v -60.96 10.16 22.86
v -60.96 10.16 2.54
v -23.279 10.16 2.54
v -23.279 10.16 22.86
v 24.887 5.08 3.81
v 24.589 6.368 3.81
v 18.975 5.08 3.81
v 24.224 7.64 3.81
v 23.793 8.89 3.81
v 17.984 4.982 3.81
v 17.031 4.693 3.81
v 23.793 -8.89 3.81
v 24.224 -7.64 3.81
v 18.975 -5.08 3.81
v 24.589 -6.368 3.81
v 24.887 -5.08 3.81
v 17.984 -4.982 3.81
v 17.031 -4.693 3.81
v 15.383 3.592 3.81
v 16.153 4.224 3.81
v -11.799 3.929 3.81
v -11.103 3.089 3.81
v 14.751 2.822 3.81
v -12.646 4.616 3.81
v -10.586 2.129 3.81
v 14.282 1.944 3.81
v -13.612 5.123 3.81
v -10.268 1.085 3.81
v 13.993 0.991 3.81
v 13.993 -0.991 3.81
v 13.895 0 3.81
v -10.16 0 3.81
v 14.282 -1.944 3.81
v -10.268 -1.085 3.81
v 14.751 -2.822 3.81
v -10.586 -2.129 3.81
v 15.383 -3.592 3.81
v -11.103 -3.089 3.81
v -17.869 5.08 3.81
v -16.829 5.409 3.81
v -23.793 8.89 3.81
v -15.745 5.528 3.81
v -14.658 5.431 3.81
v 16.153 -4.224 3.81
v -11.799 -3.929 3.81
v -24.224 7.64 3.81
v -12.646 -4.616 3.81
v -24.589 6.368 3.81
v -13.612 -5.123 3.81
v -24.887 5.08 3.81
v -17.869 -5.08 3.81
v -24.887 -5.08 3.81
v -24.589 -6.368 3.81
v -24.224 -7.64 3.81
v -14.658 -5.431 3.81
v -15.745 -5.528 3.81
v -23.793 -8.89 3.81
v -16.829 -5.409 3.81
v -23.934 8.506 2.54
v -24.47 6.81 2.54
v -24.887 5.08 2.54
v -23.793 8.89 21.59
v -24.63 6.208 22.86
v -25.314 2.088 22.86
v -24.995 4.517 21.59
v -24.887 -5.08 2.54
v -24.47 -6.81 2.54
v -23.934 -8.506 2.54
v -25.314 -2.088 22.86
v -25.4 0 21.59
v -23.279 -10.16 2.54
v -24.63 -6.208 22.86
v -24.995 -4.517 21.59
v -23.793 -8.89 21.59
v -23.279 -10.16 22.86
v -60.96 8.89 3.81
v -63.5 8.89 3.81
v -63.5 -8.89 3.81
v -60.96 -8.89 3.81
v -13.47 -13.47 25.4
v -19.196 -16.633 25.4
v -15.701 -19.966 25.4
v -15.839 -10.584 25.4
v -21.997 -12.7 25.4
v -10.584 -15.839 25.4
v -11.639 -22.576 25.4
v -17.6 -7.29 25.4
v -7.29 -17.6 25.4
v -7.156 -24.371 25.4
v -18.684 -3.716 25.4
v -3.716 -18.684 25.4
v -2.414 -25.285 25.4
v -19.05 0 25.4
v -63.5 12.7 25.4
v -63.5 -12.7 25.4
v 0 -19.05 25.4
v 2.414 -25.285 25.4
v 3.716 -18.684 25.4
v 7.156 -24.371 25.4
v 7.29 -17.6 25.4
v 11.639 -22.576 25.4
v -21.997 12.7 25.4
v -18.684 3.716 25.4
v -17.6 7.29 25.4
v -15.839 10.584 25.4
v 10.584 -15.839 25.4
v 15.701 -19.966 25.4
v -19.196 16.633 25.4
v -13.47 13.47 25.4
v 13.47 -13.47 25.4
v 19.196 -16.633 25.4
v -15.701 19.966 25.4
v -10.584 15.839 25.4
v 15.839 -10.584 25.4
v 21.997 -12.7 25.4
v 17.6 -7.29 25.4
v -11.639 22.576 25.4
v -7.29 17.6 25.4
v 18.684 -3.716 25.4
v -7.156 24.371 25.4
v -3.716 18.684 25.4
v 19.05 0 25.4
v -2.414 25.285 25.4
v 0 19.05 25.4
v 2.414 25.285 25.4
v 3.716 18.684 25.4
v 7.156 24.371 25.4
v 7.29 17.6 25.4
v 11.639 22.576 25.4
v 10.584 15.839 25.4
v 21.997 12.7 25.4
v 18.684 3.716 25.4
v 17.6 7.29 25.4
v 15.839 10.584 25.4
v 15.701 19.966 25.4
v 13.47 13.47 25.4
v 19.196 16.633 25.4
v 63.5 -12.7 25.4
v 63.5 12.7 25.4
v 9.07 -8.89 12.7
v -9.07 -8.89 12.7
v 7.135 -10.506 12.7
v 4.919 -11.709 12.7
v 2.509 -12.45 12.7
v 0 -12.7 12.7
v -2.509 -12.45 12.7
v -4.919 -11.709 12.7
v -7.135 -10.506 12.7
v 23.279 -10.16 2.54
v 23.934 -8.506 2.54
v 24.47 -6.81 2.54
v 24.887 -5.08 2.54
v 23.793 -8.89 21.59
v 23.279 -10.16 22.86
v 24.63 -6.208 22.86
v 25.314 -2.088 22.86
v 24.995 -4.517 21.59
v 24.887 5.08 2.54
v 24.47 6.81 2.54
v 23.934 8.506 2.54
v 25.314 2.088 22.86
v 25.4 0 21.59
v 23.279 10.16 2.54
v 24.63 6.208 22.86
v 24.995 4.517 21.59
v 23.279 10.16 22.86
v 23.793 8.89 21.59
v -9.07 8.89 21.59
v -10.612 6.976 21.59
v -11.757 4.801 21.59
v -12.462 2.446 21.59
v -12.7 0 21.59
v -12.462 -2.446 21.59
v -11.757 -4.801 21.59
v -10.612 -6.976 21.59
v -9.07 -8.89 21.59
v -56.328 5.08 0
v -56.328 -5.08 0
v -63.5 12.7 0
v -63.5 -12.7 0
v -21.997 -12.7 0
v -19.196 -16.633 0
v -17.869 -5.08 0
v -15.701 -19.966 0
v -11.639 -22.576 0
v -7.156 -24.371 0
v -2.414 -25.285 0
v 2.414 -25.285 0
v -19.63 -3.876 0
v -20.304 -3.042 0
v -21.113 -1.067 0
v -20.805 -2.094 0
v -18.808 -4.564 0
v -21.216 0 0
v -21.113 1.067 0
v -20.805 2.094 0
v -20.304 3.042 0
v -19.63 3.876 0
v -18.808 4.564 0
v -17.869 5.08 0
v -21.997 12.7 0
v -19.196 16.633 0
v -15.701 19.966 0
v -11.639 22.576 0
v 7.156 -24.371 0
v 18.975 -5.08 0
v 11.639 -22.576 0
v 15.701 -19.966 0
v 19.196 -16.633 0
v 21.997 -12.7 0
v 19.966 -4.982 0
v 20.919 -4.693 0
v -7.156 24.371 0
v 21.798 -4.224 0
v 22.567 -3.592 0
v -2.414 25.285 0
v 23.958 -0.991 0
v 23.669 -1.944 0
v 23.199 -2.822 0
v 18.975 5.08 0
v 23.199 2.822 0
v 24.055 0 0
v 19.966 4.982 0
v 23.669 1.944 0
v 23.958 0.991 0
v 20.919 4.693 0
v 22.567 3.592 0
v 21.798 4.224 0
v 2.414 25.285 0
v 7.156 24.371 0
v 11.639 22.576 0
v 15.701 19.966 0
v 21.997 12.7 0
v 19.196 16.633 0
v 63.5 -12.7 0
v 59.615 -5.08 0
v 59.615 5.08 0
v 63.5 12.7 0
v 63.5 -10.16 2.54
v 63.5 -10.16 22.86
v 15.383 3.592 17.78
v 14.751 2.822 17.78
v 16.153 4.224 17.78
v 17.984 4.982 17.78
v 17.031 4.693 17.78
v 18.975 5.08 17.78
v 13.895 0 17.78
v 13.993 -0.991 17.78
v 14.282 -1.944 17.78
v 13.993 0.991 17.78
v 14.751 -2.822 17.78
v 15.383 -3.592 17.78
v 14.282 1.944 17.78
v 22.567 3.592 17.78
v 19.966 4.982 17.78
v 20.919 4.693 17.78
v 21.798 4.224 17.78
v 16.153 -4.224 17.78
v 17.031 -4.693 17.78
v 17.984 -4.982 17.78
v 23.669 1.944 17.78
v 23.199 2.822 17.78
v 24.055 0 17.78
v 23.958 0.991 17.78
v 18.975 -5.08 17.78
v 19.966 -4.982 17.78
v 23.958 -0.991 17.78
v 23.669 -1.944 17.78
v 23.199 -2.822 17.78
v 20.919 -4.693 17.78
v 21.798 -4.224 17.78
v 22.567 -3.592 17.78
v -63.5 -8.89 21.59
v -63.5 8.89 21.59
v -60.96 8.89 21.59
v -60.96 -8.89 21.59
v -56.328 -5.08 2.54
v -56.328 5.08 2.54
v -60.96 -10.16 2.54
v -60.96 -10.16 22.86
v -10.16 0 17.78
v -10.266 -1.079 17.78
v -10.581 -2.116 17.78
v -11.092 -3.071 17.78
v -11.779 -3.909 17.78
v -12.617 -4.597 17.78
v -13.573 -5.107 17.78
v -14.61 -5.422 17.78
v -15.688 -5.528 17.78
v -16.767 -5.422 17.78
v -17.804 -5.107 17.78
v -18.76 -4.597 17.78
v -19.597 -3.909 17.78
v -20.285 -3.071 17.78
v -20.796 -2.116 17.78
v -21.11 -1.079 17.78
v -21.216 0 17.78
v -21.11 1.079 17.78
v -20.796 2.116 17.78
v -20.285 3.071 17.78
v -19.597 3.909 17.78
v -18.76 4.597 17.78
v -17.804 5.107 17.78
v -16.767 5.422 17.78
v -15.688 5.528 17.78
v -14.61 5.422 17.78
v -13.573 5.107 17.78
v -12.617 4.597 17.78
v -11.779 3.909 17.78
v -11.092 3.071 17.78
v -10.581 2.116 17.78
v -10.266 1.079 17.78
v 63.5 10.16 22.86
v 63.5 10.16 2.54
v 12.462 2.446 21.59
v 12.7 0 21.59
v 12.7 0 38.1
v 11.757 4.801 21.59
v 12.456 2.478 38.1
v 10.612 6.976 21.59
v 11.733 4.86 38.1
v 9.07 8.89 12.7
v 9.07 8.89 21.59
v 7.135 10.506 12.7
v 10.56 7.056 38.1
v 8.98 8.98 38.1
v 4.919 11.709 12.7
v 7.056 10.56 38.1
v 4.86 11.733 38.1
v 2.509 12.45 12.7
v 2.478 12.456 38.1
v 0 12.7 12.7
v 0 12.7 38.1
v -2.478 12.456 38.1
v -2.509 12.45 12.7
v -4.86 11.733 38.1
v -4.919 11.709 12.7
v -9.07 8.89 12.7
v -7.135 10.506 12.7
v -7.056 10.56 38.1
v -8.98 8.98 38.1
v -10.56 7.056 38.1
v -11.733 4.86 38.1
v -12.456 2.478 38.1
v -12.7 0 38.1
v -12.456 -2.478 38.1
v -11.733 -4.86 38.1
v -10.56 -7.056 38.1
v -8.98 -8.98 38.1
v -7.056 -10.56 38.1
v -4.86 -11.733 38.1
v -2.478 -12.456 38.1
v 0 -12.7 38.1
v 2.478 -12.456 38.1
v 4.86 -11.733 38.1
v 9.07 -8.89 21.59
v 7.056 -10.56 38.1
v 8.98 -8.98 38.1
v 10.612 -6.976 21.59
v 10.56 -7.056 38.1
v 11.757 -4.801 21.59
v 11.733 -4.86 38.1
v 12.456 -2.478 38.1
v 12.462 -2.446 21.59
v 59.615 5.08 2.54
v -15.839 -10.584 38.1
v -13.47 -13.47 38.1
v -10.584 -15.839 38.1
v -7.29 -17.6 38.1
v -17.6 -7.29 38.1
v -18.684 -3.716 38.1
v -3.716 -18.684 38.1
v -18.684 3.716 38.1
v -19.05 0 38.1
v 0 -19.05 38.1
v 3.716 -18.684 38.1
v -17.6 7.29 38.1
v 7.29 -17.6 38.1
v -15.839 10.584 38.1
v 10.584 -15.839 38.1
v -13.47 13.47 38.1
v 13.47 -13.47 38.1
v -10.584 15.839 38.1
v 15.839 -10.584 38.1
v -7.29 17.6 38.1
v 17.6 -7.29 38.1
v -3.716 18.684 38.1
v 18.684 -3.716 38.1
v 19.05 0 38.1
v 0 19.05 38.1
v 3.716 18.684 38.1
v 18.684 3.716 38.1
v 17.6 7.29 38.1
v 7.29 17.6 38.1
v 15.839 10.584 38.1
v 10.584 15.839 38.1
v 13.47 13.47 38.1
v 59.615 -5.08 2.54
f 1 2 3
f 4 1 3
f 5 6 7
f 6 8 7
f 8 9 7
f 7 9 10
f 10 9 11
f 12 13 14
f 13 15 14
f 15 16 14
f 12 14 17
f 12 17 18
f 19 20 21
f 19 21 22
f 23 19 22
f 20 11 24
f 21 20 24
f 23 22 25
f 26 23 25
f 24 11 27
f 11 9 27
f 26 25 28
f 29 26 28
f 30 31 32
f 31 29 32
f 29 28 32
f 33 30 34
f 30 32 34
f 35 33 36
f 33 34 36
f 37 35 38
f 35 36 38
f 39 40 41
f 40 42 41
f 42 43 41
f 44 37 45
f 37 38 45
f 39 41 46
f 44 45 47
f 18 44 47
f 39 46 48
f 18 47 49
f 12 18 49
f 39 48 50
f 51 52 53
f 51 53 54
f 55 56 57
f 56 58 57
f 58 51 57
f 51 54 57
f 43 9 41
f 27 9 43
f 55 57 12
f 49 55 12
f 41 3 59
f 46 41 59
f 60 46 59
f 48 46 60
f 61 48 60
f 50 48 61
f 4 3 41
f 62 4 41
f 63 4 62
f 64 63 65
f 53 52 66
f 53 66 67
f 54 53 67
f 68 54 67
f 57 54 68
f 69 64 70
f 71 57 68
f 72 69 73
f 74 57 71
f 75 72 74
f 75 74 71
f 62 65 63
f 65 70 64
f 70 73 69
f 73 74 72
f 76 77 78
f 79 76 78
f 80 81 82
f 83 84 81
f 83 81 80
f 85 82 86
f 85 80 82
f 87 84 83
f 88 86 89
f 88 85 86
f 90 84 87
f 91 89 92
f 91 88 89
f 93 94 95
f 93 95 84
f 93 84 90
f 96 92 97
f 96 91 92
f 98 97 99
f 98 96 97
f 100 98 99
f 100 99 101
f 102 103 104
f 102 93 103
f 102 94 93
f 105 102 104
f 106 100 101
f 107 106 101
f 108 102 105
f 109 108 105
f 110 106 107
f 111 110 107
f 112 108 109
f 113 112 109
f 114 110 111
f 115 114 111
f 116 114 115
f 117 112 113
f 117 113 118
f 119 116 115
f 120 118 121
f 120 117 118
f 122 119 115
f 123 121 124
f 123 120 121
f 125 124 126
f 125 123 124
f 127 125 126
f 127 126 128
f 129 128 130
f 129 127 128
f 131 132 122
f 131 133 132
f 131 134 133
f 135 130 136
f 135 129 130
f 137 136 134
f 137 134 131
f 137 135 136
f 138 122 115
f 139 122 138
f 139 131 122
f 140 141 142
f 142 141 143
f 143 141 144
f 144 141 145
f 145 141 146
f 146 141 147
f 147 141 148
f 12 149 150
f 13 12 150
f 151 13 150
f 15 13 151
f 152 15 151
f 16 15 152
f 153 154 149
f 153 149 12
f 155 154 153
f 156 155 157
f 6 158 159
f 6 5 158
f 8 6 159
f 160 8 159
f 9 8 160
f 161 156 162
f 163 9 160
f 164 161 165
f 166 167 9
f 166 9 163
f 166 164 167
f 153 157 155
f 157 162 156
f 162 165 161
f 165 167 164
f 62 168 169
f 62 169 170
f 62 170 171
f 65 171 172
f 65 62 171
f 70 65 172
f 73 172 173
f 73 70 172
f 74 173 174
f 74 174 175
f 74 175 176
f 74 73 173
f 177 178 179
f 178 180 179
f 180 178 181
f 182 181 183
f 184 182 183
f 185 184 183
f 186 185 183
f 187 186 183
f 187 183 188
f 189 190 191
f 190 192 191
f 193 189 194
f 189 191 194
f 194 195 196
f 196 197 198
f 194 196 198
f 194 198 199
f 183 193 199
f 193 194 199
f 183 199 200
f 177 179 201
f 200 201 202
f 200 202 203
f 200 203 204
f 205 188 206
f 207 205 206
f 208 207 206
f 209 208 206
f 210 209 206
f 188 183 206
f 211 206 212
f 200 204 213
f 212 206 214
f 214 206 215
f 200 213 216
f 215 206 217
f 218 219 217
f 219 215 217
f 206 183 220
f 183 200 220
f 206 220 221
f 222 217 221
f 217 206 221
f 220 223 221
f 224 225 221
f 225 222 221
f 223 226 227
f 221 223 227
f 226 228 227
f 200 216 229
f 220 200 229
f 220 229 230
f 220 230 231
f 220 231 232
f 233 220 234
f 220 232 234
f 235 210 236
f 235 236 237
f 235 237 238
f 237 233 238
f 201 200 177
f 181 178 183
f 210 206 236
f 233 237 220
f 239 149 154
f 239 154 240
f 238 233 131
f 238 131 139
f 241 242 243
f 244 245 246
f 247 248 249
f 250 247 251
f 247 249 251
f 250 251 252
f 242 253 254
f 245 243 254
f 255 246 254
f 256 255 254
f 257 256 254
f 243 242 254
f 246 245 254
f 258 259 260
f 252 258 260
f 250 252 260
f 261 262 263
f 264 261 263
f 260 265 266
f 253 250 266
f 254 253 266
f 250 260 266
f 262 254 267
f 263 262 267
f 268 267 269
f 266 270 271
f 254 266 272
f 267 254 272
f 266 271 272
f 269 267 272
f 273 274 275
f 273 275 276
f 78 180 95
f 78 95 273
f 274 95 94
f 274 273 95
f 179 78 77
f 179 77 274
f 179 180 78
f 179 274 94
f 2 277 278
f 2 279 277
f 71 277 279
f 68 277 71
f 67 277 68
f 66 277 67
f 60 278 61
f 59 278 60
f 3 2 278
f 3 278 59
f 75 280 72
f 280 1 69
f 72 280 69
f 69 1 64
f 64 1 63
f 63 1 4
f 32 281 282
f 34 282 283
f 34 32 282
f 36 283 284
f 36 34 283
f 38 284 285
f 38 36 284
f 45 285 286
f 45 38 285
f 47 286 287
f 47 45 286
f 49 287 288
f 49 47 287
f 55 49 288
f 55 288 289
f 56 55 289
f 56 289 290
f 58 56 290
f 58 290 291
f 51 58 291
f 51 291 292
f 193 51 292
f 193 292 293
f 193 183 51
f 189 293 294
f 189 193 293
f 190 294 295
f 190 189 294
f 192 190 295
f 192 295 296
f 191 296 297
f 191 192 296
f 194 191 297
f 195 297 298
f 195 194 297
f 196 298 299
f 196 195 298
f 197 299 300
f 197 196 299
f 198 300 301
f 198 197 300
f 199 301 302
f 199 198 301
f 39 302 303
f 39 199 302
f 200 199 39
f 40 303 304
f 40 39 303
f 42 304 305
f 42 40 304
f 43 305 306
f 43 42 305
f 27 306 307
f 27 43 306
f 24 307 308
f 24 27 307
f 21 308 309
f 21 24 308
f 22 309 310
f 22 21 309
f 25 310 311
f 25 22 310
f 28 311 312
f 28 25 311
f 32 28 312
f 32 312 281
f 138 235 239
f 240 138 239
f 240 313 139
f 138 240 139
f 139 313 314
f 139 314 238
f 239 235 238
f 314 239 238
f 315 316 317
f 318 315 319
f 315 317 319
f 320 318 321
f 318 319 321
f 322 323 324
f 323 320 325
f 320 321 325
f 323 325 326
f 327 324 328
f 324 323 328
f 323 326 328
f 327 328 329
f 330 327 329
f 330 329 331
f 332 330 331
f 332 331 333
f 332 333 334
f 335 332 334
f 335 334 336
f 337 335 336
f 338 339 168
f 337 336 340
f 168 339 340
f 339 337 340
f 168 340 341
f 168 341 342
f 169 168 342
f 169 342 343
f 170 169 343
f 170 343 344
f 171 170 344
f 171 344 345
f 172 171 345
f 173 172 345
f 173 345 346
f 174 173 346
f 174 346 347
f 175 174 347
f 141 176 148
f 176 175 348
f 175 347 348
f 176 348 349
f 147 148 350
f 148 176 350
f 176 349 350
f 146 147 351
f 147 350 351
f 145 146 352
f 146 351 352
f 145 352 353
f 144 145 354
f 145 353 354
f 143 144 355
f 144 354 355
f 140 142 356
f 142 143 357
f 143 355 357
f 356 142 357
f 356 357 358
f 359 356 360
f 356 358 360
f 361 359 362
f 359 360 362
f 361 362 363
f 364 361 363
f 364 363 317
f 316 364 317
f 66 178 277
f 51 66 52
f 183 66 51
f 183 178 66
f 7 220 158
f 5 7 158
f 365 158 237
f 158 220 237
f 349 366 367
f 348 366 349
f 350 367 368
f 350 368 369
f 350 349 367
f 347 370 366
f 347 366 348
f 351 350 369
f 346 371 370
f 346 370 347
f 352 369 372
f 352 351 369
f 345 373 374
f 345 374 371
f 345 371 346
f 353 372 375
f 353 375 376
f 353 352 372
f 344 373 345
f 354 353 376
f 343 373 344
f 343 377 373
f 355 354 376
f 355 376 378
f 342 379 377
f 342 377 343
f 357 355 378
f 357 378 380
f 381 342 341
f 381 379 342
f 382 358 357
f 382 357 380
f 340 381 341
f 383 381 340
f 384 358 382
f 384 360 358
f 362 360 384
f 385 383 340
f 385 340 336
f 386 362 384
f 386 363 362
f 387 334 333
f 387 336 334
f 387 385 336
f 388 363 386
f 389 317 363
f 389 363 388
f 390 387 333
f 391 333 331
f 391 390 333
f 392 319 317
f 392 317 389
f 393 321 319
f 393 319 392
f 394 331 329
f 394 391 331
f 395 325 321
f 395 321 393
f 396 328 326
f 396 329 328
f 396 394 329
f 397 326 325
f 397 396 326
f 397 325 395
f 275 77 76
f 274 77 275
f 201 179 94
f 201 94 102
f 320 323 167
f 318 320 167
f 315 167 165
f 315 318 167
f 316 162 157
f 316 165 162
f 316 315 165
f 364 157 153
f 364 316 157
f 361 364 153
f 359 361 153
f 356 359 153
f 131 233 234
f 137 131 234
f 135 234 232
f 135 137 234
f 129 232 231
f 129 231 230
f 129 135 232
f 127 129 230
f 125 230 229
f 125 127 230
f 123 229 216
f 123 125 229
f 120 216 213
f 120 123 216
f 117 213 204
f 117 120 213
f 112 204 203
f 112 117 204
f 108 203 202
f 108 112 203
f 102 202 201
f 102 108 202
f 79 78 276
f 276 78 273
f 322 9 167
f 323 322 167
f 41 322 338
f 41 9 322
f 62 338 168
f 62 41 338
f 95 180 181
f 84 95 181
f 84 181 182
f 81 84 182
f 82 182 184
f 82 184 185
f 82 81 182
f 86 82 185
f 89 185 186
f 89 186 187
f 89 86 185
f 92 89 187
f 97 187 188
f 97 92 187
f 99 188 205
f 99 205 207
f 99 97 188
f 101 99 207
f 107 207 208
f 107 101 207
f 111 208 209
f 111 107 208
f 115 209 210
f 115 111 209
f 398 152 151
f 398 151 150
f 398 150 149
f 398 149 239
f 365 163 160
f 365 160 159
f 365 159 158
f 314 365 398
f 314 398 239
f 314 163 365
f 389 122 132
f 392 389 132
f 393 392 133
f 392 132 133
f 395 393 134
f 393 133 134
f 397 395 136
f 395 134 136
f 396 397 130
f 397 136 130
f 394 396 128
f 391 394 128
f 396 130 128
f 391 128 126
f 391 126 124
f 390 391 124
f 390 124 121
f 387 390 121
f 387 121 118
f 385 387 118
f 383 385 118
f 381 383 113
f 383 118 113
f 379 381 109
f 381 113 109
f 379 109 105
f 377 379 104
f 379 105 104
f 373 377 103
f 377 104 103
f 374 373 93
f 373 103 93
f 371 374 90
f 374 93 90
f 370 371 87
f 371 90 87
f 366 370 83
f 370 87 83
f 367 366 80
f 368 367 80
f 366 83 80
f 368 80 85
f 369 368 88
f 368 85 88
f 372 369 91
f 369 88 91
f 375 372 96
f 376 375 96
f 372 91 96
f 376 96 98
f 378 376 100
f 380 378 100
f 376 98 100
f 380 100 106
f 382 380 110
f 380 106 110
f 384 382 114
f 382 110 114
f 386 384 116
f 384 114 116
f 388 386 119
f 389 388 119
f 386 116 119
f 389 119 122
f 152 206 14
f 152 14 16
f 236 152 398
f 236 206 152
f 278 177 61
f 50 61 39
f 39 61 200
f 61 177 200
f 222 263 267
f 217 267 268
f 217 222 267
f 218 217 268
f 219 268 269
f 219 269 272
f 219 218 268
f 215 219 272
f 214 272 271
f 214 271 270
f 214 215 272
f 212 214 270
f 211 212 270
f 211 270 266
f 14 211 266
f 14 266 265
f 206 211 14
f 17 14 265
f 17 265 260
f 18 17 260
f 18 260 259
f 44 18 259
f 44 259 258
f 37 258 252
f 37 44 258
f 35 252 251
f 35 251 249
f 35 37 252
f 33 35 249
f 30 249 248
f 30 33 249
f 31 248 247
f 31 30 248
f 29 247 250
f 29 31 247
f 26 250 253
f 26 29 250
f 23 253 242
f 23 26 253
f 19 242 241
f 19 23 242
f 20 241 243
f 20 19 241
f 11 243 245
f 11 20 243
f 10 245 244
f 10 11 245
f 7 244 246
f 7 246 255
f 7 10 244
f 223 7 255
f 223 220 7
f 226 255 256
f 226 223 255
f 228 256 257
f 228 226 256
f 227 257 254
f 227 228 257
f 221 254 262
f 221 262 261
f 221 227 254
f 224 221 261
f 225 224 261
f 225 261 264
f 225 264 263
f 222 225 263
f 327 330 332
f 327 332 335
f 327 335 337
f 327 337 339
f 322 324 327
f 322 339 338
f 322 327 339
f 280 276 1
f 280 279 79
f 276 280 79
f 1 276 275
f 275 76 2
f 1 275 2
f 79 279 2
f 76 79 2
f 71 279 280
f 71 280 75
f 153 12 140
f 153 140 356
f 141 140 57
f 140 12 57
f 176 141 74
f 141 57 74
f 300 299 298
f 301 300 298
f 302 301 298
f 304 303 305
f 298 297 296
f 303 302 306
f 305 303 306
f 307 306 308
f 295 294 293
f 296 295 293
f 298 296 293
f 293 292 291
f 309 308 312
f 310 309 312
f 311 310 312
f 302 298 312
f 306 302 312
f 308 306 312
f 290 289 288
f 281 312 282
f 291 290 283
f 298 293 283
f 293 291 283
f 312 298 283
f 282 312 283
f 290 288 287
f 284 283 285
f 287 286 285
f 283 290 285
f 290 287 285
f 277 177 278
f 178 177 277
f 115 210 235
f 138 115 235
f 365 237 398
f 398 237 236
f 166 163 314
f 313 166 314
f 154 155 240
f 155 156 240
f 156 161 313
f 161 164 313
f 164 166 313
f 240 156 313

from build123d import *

# Parameters (mm, degrees)
F0_W      = 127
F0_H      = 25.4
F1_DEPTH  = 25.4
F2_T      = -2.54
F3_R      = 25.4
F4_DEPTH  = 25.4
F5_R      = 19.05
F6_DEPTH  = 12.7
F7_R      = 12.7
F8_DEPTH  = 25.4
F9_W      = 17.78
F9_H      = 17.78
F10_DEPTH = 150.622
F11_W     = 40.64
F11_H     = 10.16
F12_DEPTH = 12.7
F13_R     = 5.528236
F13_R_2   = 5.08
F14_DEPTH = 17.78


with BuildPart() as f1:
    # F0 (on Top) → F1 (new body)
    with BuildSketch(Plane.XY):
        Rectangle(F0_W, F0_H)
    extrude(amount=F1_DEPTH)

    # F2
    f2_openings = [f1.faces().sort_by_distance(p)[0] for p in [
        (63.5, 0, 12.7),
    ]]
    offset(amount=F2_T, openings=f2_openings)

    # F3 (on face) → F4 (join)
    with BuildSketch(Plane.XY.offset(25.4)):
        Circle(F3_R)
    extrude(amount=-F4_DEPTH)

    # F5 (on face) → F6 (join)
    with BuildSketch(Plane.XY.offset(25.4)):
        Circle(F5_R)
    extrude(amount=F6_DEPTH)

    # F7 (on face) → F8 (cut)
    with BuildSketch(Plane.XY.offset(38.1)):
        Circle(F7_R)
    extrude(amount=-F8_DEPTH, mode=Mode.SUBTRACT)

    # F9 (on face) → F10 (cut)
    with BuildSketch(Plane(origin=(-63.5, 0, 0), x_dir=(0, -1, 0), z_dir=(-1, 0, 0))):
        with Locations((0, 12.7)):
            Rectangle(F9_W, F9_H)
    extrude(amount=-F10_DEPTH, mode=Mode.SUBTRACT)

    # F11 (on face) → F12 (cut)
    with BuildSketch(Plane(origin=(0, 0, 0), x_dir=(1, 0, 0), z_dir=(0, 0, -1))):
        with Locations((-36.008236, 0)):
            Rectangle(F11_W, F11_H)
        with Locations((39.295297, 0)):
            Rectangle(F11_W, F11_H)
    extrude(amount=-F12_DEPTH, mode=Mode.SUBTRACT)

    # F13 (on face) → F14 (join)
    with BuildSketch(Plane(origin=(0, 0, 0), x_dir=(1, 0, 0), z_dir=(0, 0, -1))):
        with Locations((-15.688236, 0)):
            Circle(F13_R)
        with Locations((18.975297, 0)):
            Circle(F13_R_2)
    extrude(amount=-F14_DEPTH)


solid = f1.part
